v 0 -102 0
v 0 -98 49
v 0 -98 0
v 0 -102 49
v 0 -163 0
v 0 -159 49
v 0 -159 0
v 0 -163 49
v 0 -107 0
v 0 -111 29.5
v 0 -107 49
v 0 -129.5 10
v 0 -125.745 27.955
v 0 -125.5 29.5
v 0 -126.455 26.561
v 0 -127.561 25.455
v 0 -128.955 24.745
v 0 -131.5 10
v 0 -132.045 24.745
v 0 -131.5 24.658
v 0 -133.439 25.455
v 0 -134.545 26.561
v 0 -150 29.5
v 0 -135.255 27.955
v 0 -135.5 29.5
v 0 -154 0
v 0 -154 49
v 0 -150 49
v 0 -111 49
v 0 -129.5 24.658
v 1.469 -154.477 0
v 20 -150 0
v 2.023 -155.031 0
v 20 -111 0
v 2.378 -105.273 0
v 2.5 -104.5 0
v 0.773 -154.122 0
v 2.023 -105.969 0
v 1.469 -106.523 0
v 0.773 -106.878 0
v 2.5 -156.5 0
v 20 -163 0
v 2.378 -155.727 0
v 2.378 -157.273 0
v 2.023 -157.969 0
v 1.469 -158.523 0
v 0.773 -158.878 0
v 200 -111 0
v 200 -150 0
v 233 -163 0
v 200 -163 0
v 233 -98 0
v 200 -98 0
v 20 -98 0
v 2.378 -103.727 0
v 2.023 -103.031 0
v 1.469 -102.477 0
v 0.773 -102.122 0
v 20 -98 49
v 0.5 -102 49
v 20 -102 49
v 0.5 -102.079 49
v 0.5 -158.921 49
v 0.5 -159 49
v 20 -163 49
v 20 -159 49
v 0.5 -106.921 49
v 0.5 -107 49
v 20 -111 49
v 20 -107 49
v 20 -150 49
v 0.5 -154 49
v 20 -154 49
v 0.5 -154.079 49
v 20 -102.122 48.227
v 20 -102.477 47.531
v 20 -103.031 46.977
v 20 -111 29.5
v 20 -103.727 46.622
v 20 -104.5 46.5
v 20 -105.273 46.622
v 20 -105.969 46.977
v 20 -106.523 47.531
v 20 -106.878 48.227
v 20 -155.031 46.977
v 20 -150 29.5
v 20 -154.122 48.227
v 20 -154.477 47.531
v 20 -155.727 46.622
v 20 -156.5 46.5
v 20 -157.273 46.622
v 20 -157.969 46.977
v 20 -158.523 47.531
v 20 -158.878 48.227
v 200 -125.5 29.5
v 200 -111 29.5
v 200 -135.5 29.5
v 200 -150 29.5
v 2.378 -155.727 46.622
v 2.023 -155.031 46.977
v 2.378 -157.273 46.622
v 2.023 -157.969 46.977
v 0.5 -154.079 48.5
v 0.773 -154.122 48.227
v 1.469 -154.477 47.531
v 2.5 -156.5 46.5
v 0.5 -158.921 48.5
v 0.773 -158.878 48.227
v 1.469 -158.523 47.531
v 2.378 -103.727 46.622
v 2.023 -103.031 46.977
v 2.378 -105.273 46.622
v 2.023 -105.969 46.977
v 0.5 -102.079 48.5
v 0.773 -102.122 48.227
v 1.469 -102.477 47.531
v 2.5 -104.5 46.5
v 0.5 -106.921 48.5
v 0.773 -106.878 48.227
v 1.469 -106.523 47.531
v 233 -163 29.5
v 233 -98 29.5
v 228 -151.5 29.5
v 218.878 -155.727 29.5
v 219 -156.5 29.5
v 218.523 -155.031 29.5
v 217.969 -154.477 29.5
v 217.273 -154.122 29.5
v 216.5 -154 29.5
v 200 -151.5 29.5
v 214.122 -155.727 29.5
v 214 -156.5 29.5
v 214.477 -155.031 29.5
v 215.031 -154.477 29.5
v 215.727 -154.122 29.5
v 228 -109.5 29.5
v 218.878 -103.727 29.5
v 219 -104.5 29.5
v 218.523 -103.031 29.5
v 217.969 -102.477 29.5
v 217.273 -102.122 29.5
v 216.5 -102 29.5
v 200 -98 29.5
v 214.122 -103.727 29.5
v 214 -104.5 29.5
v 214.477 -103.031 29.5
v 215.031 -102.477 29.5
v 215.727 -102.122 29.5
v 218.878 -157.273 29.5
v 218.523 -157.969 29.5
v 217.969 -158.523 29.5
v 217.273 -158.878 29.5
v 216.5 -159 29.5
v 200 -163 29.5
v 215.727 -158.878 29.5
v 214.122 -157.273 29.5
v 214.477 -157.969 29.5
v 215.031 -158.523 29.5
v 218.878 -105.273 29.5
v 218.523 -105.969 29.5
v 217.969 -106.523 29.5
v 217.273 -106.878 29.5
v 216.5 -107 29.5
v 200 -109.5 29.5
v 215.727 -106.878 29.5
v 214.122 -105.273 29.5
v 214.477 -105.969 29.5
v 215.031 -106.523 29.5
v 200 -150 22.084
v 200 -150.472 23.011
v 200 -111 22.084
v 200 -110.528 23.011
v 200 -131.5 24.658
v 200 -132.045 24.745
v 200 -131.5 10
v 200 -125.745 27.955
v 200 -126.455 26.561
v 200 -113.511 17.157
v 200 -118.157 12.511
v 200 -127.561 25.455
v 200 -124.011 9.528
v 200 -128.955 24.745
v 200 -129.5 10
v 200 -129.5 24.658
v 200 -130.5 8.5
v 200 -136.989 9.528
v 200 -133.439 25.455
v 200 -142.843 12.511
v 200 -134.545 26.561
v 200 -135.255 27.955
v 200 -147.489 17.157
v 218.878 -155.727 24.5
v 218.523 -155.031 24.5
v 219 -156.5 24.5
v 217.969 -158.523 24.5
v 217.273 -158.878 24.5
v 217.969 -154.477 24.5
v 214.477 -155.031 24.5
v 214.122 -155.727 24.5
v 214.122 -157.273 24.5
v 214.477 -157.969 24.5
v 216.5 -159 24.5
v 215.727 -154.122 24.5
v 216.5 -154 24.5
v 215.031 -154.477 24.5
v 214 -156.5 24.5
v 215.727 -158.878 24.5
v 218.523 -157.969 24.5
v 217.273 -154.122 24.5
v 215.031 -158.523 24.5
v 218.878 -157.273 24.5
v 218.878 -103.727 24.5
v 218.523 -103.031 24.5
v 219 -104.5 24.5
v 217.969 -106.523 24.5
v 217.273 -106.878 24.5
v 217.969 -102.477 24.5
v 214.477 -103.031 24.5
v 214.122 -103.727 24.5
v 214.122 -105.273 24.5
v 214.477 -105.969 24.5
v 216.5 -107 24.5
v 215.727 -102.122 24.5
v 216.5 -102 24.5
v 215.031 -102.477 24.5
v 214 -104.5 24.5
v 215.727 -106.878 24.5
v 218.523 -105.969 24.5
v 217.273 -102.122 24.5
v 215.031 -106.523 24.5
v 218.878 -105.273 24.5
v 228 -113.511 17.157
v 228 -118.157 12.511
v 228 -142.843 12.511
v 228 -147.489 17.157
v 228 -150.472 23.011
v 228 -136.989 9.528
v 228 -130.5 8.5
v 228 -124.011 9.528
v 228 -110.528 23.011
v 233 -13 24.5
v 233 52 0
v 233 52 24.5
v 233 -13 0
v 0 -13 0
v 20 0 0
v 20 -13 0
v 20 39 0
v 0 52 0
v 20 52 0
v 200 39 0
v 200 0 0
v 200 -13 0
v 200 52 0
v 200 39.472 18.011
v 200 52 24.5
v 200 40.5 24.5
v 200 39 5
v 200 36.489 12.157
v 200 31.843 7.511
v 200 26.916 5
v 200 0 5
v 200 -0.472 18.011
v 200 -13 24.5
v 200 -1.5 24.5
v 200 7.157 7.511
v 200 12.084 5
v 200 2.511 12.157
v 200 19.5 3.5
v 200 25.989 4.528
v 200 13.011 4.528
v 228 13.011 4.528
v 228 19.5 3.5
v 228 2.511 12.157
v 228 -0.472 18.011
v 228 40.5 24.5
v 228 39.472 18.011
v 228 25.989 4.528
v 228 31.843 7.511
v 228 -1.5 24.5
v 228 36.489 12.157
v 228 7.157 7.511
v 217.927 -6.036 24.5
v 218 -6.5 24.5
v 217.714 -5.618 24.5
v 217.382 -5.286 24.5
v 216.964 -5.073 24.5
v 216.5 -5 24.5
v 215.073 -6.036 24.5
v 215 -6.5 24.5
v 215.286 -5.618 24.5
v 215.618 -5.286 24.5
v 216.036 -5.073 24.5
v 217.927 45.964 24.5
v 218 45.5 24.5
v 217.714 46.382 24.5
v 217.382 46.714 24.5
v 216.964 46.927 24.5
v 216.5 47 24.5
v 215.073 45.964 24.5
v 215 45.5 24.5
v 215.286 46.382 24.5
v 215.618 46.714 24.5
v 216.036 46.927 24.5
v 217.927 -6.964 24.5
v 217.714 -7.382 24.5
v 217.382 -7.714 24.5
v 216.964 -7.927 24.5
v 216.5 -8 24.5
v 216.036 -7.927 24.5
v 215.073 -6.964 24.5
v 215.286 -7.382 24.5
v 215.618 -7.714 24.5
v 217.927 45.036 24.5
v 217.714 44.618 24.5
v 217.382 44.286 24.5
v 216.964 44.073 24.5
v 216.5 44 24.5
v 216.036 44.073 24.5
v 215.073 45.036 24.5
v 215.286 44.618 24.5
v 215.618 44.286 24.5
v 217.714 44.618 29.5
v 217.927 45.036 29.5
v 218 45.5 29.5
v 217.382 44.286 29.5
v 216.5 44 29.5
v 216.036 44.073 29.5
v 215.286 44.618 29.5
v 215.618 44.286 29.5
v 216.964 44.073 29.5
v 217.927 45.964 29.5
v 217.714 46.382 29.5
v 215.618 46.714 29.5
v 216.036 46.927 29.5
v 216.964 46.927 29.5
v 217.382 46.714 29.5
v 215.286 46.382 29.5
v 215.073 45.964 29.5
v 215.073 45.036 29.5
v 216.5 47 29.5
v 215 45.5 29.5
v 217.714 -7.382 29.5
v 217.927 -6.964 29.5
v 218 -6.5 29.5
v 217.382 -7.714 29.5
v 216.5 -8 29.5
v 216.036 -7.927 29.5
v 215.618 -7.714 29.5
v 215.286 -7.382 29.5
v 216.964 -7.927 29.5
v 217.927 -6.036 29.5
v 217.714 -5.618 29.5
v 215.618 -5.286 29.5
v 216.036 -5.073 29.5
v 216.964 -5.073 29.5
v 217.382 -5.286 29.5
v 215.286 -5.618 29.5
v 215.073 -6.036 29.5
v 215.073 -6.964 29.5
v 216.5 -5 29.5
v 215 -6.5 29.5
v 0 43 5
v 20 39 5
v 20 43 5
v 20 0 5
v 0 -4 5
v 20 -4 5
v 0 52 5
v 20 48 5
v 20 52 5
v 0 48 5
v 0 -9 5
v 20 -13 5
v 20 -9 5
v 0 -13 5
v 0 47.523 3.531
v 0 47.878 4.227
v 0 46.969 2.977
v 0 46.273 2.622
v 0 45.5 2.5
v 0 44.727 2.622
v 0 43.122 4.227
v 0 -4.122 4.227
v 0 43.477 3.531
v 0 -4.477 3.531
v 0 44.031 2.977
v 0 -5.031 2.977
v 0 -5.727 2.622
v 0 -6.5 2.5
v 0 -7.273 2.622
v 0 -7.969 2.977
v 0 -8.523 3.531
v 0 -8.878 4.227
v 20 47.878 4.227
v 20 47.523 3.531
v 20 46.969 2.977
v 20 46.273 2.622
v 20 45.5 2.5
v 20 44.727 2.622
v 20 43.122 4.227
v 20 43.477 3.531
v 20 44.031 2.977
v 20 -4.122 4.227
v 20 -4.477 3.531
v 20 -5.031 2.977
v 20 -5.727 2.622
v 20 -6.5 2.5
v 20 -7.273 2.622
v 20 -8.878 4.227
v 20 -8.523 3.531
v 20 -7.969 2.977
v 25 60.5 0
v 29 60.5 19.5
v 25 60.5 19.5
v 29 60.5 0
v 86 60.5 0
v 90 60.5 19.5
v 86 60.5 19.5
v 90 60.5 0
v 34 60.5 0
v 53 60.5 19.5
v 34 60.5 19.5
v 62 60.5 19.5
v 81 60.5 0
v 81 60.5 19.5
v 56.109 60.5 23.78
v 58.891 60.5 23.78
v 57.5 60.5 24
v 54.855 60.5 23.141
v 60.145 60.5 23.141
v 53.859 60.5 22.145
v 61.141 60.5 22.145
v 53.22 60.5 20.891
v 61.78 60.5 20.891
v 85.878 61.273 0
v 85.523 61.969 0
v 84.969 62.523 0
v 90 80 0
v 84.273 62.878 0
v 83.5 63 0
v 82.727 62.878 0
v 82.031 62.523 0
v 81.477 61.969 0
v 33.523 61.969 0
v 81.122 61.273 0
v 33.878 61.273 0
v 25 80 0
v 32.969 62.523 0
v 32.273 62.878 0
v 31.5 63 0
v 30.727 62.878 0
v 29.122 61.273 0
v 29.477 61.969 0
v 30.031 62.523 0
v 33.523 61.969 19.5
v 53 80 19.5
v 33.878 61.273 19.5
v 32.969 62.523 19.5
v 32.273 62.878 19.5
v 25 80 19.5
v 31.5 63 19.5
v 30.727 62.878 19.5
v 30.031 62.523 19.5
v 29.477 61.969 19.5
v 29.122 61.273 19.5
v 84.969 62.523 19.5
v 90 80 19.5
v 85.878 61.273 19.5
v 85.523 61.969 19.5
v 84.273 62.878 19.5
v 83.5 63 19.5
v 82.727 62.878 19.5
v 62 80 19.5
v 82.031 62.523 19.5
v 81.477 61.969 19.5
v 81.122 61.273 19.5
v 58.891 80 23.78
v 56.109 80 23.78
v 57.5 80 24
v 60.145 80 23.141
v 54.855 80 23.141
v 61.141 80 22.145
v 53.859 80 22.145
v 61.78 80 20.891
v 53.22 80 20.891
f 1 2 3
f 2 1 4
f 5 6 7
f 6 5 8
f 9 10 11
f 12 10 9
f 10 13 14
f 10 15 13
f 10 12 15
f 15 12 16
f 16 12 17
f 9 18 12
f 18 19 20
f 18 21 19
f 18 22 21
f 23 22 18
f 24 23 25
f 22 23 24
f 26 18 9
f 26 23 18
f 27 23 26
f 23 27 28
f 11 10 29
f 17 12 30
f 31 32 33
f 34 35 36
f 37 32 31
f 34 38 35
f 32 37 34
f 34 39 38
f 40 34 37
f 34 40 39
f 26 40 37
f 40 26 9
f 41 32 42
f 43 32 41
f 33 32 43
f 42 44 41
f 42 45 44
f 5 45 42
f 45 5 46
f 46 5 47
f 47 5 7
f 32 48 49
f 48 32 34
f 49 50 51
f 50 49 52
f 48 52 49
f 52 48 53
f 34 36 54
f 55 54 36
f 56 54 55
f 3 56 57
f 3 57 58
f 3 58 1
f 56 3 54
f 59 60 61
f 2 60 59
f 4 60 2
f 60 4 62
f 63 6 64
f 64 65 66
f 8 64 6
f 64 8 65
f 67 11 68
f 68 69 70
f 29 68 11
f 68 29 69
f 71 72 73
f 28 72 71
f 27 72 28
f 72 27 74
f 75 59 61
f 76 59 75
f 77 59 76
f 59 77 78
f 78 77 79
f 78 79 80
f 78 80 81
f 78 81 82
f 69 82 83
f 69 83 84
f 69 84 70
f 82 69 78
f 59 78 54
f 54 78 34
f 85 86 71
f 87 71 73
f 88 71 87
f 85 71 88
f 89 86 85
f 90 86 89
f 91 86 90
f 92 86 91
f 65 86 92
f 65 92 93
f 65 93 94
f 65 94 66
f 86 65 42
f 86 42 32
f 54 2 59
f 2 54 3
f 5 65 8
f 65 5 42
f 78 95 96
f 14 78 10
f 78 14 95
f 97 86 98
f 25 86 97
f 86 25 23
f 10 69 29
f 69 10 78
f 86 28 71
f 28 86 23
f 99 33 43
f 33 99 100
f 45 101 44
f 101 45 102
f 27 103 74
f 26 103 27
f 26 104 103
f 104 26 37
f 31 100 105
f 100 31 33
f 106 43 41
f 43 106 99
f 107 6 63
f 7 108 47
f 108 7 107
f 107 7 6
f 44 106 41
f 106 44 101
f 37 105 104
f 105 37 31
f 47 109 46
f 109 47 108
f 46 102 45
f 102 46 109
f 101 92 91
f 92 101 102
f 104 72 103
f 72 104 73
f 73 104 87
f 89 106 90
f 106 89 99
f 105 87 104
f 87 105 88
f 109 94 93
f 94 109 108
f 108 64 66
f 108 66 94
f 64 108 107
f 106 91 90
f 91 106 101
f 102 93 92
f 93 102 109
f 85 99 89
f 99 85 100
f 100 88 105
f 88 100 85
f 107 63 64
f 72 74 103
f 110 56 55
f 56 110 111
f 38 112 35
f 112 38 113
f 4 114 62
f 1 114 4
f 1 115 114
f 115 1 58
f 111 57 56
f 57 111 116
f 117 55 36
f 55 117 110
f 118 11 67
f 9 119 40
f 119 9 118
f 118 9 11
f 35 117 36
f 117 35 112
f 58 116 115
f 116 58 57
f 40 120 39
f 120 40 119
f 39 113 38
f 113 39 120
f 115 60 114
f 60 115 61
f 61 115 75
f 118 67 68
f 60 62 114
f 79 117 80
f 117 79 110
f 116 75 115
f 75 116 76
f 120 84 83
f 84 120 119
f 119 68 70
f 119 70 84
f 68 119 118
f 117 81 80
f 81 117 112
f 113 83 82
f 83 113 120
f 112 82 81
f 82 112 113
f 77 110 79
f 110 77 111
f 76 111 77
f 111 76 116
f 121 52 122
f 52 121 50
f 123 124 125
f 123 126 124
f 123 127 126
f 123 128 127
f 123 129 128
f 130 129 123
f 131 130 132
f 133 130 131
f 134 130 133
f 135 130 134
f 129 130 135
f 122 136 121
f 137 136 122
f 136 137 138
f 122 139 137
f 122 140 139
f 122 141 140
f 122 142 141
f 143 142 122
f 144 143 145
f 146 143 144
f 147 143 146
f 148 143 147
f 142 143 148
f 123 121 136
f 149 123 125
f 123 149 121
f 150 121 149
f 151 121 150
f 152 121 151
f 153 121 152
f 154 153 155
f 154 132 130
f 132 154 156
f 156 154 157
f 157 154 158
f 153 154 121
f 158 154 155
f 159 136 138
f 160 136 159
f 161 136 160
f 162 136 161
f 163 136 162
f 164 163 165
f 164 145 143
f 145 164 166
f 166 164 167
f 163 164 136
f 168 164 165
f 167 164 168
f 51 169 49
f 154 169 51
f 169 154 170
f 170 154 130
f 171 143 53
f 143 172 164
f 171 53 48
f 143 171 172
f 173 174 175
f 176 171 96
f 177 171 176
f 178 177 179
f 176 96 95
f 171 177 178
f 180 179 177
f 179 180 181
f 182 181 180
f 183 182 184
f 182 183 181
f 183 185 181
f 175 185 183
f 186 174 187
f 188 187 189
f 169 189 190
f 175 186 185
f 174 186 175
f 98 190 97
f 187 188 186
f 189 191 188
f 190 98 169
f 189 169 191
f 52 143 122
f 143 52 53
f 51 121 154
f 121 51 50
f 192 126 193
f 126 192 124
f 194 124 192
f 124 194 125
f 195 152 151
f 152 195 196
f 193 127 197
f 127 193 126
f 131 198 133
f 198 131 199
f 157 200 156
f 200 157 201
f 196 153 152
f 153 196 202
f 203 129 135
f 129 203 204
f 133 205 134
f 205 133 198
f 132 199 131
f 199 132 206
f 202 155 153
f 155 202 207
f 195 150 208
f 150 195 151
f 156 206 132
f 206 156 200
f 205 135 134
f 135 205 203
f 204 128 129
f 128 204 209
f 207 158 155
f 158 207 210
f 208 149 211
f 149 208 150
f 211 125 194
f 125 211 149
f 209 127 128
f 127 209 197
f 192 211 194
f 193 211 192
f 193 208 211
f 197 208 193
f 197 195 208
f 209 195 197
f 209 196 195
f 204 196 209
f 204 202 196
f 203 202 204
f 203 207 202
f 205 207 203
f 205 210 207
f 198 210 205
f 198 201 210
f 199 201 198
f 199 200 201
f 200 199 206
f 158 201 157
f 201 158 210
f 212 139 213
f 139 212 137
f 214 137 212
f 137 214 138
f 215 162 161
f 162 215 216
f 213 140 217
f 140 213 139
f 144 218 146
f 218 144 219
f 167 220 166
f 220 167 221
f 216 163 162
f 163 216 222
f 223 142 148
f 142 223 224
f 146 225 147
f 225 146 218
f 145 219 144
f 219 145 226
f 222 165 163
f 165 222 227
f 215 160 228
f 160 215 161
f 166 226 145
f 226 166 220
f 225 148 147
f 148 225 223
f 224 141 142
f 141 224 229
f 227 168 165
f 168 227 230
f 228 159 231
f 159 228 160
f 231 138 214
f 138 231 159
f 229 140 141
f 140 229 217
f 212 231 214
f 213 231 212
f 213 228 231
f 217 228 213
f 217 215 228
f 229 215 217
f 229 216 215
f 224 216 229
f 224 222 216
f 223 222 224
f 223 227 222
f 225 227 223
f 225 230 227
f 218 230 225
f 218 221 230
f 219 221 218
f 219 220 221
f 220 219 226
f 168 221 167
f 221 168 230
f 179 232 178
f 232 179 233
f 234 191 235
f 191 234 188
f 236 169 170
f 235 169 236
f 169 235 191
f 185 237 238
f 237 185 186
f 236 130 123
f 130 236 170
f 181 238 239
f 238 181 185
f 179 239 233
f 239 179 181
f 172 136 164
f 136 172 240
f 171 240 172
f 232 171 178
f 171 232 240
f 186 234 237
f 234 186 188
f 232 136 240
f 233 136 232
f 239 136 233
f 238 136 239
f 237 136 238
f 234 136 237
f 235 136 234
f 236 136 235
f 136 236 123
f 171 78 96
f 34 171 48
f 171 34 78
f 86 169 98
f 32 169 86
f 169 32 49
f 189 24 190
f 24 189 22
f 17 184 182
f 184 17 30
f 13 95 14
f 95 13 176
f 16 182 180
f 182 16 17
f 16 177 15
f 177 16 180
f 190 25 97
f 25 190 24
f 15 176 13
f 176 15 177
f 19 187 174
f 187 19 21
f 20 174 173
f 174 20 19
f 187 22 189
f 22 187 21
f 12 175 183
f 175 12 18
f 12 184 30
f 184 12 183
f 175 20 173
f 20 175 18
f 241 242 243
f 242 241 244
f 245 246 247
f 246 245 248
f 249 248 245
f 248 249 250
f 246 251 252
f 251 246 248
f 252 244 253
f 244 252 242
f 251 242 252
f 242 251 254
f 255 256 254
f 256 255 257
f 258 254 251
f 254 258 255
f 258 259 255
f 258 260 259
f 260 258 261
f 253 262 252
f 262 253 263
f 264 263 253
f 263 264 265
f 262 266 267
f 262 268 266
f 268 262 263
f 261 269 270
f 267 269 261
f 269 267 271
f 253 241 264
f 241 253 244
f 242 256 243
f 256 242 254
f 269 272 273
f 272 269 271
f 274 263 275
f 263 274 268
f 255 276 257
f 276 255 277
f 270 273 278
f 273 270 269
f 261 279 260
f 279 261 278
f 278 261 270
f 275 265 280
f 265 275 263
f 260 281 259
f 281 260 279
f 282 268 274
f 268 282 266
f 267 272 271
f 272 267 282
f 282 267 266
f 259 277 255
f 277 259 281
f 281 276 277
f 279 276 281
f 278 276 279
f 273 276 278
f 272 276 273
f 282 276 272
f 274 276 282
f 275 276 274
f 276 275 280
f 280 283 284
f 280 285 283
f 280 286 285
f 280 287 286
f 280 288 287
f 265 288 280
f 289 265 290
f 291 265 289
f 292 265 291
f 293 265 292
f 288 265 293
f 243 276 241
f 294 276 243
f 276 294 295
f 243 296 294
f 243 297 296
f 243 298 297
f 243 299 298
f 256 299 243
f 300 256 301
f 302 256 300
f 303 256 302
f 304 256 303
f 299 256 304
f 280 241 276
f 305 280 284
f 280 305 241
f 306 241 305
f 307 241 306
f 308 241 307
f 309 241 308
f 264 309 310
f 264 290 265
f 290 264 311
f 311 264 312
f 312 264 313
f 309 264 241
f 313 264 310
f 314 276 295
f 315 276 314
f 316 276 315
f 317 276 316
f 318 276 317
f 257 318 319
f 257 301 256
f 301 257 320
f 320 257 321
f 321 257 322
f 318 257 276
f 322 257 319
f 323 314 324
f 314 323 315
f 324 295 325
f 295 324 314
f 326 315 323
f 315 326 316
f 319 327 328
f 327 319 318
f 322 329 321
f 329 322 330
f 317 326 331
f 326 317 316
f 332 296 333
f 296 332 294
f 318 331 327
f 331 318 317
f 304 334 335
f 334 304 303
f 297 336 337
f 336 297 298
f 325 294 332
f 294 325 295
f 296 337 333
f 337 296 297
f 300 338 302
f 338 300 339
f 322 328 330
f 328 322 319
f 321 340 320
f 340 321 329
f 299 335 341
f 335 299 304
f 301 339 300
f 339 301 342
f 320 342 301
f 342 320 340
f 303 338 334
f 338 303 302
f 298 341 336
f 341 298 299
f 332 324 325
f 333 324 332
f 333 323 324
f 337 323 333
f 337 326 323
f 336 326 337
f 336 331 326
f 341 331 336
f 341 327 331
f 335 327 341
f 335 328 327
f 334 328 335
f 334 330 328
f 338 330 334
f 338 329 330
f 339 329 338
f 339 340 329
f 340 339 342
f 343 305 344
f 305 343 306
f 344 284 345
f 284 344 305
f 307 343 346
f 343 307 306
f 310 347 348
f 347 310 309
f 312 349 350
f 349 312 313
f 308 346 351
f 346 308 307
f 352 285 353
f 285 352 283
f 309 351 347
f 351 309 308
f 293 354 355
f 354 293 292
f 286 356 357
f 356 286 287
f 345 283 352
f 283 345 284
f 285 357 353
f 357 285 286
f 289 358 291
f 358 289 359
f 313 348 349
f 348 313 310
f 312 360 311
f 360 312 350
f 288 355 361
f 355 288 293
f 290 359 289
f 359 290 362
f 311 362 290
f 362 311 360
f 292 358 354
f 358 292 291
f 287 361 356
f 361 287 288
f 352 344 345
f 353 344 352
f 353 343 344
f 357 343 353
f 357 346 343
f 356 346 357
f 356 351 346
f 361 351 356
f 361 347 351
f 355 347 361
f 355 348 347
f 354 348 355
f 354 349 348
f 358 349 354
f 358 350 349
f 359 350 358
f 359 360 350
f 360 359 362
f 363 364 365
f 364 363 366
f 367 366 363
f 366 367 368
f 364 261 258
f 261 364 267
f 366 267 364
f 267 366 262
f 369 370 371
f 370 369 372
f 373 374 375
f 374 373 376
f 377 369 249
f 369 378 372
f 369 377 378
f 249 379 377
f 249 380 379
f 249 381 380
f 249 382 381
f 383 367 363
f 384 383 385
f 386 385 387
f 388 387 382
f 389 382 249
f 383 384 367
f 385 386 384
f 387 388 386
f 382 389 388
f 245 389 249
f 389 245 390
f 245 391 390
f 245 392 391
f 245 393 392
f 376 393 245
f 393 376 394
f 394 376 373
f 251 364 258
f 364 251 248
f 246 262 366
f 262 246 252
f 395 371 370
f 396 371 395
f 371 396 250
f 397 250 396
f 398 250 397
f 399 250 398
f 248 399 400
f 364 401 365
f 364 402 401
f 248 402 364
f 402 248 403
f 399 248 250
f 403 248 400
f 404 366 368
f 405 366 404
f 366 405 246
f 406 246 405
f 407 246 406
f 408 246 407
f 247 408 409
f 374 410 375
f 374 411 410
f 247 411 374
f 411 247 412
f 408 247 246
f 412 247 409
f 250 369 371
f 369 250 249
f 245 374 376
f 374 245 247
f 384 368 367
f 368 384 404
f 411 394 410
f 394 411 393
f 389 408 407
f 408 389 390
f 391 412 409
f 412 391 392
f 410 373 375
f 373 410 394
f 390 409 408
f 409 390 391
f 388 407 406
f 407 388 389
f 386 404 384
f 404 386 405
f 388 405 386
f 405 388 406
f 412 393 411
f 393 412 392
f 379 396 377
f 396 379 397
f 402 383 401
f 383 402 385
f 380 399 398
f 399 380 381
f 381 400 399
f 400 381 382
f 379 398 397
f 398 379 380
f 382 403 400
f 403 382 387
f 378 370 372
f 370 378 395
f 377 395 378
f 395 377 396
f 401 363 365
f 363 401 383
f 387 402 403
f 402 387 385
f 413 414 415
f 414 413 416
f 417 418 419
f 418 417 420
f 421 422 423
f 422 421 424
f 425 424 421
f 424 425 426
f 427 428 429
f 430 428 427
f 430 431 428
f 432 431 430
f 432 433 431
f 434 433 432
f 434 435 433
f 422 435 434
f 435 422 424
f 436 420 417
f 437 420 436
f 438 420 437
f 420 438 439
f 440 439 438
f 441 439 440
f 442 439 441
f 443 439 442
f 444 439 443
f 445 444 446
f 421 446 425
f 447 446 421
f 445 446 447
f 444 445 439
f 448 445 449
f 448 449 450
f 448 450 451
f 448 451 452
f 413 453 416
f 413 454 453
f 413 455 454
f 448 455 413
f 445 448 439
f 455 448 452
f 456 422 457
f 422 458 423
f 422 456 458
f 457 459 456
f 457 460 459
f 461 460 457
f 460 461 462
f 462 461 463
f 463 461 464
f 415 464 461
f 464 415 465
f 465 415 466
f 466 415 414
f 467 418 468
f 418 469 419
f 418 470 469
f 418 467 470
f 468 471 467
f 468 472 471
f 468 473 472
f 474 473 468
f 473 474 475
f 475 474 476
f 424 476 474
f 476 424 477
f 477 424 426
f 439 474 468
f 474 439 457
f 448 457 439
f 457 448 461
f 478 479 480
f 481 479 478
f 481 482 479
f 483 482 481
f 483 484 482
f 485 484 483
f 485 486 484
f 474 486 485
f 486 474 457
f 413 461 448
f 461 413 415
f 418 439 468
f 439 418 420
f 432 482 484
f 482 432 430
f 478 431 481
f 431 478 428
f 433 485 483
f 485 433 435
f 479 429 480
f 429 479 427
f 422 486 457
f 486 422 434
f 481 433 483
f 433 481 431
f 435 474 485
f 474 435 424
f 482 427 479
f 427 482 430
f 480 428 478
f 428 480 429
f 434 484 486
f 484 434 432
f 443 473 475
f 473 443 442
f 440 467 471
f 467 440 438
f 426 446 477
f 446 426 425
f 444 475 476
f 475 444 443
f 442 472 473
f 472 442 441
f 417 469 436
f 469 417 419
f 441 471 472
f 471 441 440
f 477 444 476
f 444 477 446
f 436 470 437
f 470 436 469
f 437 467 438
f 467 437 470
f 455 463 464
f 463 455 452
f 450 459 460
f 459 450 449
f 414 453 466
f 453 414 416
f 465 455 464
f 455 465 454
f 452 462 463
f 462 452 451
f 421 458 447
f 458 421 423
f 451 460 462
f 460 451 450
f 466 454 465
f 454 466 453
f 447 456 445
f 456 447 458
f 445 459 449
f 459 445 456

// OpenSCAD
$fn = 20;

/*
 * These values are measured for our darts set etc
 */
electromagnet_radius = 20 + 1; // 2 cm + 1 mm
electromagnet_height = 27 + 1; // 2.7 cm
elastic_radius = 2.5; // 2.5 mm
flight_radius = 17.5 + 2; // 1.75 cm + 2 mm
shaft_radius = 4 + 1; // 4 mm + 1 mm
dart_length = 150; // 15 cm
flight_depth = 2; // 2 mm

padding = 10; // 1 cm
back_padding = electromagnet_height + 5;
device_length = 200; // 20 cm

sled_width = flight_radius; // Equal to the flight radius.
sled_height = 10; // 1 cm
sled_padding = (2 * elastic_radius) + 8; // Space between for structural integrity
sled_depth = (flight_radius * 2) + (sled_padding * 2);
sled_cutout_radius = shaft_radius - .5; // Subtract a bit from the structure so we can actually slide.

pin_depth = 5; // 5 mm

roof_height = 5;

module sled() {
    // Sled on the top of the barrel
    translate([0, 0, sled_height])
        rotate([0, 180, 0])
            difference() {
                union() {
                    cube([sled_width, sled_depth, flight_radius]);
                    translate([0, sled_depth / 2, 0])
                        rotate([0, 90, 0])
                            cylinder(r = sled_cutout_radius, h = sled_width);
                }

                translate([sled_width, elastic_radius + 4, 0])
                    cylinder(r = elastic_radius, h = sled_width);

                translate([sled_width, sled_depth - elastic_radius - 4, 0])
                    cylinder(r = elastic_radius, h = sled_width);
            }
}

module roof() {
    difference() {
        union() {
            cube([device_length, flight_radius * 2, roof_height]);

            rotate([180, 0, 0])
                translate([device_length, - sled_depth + sled_padding, - padding - flight_radius * 2 - roof_height])
                    back(true);

            translate([0, - sled_padding, 0])
                cube([sled_height * 2, sled_depth, roof_height]);
        }

        translate([0, - elastic_radius - 4, roof_height])
            rotate([0, 90, 0])
                cylinder(r = elastic_radius, h = sled_height * 2);

        translate([0, sled_depth - sled_padding - elastic_radius - 4, roof_height])
            rotate([0, 90, 0])
                cylinder(r = elastic_radius, h = sled_height * 2);
    }
}

module back(isTop) {
    difference() {
        // Guard on the back
        cube([back_padding, sled_depth, padding + flight_radius + flight_radius + roof_height]);

        // Electromagnet cutout
        rotate([0, 90, 0])
            translate([- padding - flight_radius, sled_padding + flight_radius, 0])
                cylinder(r = electromagnet_radius, h = electromagnet_height);

        if (isTop == false) {
            // Cut off the top
            translate([0, 0, padding + flight_radius])
                cube([back_padding, sled_depth, flight_radius + roof_height]);

            // Left pin
            translate([back_padding / 2, sled_padding / 2, padding + flight_radius - pin_depth])
                cylinder(r = elastic_radius, h = pin_depth);

            // Right pin
            translate([back_padding / 2,
                        sled_padding + flight_radius * 2 + sled_padding / 2,
                        padding + flight_radius - pin_depth])
                cylinder(r = elastic_radius, h = pin_depth);
        } else {
            // Cut off the bottom
            cube([back_padding, sled_depth, padding + flight_radius]);
        }
    }

    if (isTop == true) {
        // Left pin
        translate([back_padding / 2, sled_padding / 2, padding + flight_radius - pin_depth])
            cylinder(r = elastic_radius - 1, h = pin_depth);

        // Right pin
        translate([back_padding / 2,
                    sled_padding + flight_radius * 2 + sled_padding / 2,
                    padding + flight_radius - pin_depth])
            cylinder(r = elastic_radius - 1, h = pin_depth);
    }
}

module barrel() {
    difference() {
        union() {
            // Dart barrel
            cube([device_length, flight_radius * 2, flight_radius + padding]);

            // Sled on the front of the barrel for holding the elastic band
            translate([sled_height, - sled_padding, flight_radius + padding + sled_width])
                rotate([0, 180, 0])
                    difference() {
                        // Pillar cube
                        translate([- sled_height, 0, 0])
                            cube([sled_height * 2, sled_depth, flight_radius + padding + sled_width]);

                        // Gap between pillars
                        translate([- sled_height, sled_padding, 0])
                            cube([sled_height * 2, flight_radius * 2, sled_width]);

                        // Right cutout
                        translate([sled_height, elastic_radius + 4, 0])
                            cylinder(r = elastic_radius, h = flight_radius + padding + sled_width);

                        // Top right cutout
                        translate([- sled_height, elastic_radius + 4, 0])
                            rotate([0, 90, 0])
                                cylinder(r = elastic_radius, h = sled_width);

                        // Left cutout
                        translate([sled_height, sled_depth - elastic_radius - 4, 0])
                            cylinder(r = elastic_radius, h = flight_radius + padding + sled_width);

                        // Top left cutout
                        translate([- sled_height, sled_depth - elastic_radius - 4, 0])
                            rotate([0, 90, 0])
                                cylinder(r = elastic_radius, h = sled_width);
                    }

            translate([device_length, - sled_padding, 0])
                back(false);
        }

        // Shaft cutout
        rotate([0, 90, 0])
            translate([- flight_radius - padding, flight_radius, 0])
                cylinder(r = shaft_radius, h = device_length);

        // Flight cutout
        translate([0, flight_radius - (flight_depth / 2), padding])
            cube([device_length, flight_depth, flight_radius + 1]);
    }
}

module electromagnet() {
    translate([0, electromagnet_radius, electromagnet_radius])
        rotate([0, 90, 0])
            cylinder(r = electromagnet_radius, h = electromagnet_height);
}

translate([0, - 150])
    barrel();

roof();

translate([90, 80, 9.5])
    rotate([0, 0, 90])
        sled();
